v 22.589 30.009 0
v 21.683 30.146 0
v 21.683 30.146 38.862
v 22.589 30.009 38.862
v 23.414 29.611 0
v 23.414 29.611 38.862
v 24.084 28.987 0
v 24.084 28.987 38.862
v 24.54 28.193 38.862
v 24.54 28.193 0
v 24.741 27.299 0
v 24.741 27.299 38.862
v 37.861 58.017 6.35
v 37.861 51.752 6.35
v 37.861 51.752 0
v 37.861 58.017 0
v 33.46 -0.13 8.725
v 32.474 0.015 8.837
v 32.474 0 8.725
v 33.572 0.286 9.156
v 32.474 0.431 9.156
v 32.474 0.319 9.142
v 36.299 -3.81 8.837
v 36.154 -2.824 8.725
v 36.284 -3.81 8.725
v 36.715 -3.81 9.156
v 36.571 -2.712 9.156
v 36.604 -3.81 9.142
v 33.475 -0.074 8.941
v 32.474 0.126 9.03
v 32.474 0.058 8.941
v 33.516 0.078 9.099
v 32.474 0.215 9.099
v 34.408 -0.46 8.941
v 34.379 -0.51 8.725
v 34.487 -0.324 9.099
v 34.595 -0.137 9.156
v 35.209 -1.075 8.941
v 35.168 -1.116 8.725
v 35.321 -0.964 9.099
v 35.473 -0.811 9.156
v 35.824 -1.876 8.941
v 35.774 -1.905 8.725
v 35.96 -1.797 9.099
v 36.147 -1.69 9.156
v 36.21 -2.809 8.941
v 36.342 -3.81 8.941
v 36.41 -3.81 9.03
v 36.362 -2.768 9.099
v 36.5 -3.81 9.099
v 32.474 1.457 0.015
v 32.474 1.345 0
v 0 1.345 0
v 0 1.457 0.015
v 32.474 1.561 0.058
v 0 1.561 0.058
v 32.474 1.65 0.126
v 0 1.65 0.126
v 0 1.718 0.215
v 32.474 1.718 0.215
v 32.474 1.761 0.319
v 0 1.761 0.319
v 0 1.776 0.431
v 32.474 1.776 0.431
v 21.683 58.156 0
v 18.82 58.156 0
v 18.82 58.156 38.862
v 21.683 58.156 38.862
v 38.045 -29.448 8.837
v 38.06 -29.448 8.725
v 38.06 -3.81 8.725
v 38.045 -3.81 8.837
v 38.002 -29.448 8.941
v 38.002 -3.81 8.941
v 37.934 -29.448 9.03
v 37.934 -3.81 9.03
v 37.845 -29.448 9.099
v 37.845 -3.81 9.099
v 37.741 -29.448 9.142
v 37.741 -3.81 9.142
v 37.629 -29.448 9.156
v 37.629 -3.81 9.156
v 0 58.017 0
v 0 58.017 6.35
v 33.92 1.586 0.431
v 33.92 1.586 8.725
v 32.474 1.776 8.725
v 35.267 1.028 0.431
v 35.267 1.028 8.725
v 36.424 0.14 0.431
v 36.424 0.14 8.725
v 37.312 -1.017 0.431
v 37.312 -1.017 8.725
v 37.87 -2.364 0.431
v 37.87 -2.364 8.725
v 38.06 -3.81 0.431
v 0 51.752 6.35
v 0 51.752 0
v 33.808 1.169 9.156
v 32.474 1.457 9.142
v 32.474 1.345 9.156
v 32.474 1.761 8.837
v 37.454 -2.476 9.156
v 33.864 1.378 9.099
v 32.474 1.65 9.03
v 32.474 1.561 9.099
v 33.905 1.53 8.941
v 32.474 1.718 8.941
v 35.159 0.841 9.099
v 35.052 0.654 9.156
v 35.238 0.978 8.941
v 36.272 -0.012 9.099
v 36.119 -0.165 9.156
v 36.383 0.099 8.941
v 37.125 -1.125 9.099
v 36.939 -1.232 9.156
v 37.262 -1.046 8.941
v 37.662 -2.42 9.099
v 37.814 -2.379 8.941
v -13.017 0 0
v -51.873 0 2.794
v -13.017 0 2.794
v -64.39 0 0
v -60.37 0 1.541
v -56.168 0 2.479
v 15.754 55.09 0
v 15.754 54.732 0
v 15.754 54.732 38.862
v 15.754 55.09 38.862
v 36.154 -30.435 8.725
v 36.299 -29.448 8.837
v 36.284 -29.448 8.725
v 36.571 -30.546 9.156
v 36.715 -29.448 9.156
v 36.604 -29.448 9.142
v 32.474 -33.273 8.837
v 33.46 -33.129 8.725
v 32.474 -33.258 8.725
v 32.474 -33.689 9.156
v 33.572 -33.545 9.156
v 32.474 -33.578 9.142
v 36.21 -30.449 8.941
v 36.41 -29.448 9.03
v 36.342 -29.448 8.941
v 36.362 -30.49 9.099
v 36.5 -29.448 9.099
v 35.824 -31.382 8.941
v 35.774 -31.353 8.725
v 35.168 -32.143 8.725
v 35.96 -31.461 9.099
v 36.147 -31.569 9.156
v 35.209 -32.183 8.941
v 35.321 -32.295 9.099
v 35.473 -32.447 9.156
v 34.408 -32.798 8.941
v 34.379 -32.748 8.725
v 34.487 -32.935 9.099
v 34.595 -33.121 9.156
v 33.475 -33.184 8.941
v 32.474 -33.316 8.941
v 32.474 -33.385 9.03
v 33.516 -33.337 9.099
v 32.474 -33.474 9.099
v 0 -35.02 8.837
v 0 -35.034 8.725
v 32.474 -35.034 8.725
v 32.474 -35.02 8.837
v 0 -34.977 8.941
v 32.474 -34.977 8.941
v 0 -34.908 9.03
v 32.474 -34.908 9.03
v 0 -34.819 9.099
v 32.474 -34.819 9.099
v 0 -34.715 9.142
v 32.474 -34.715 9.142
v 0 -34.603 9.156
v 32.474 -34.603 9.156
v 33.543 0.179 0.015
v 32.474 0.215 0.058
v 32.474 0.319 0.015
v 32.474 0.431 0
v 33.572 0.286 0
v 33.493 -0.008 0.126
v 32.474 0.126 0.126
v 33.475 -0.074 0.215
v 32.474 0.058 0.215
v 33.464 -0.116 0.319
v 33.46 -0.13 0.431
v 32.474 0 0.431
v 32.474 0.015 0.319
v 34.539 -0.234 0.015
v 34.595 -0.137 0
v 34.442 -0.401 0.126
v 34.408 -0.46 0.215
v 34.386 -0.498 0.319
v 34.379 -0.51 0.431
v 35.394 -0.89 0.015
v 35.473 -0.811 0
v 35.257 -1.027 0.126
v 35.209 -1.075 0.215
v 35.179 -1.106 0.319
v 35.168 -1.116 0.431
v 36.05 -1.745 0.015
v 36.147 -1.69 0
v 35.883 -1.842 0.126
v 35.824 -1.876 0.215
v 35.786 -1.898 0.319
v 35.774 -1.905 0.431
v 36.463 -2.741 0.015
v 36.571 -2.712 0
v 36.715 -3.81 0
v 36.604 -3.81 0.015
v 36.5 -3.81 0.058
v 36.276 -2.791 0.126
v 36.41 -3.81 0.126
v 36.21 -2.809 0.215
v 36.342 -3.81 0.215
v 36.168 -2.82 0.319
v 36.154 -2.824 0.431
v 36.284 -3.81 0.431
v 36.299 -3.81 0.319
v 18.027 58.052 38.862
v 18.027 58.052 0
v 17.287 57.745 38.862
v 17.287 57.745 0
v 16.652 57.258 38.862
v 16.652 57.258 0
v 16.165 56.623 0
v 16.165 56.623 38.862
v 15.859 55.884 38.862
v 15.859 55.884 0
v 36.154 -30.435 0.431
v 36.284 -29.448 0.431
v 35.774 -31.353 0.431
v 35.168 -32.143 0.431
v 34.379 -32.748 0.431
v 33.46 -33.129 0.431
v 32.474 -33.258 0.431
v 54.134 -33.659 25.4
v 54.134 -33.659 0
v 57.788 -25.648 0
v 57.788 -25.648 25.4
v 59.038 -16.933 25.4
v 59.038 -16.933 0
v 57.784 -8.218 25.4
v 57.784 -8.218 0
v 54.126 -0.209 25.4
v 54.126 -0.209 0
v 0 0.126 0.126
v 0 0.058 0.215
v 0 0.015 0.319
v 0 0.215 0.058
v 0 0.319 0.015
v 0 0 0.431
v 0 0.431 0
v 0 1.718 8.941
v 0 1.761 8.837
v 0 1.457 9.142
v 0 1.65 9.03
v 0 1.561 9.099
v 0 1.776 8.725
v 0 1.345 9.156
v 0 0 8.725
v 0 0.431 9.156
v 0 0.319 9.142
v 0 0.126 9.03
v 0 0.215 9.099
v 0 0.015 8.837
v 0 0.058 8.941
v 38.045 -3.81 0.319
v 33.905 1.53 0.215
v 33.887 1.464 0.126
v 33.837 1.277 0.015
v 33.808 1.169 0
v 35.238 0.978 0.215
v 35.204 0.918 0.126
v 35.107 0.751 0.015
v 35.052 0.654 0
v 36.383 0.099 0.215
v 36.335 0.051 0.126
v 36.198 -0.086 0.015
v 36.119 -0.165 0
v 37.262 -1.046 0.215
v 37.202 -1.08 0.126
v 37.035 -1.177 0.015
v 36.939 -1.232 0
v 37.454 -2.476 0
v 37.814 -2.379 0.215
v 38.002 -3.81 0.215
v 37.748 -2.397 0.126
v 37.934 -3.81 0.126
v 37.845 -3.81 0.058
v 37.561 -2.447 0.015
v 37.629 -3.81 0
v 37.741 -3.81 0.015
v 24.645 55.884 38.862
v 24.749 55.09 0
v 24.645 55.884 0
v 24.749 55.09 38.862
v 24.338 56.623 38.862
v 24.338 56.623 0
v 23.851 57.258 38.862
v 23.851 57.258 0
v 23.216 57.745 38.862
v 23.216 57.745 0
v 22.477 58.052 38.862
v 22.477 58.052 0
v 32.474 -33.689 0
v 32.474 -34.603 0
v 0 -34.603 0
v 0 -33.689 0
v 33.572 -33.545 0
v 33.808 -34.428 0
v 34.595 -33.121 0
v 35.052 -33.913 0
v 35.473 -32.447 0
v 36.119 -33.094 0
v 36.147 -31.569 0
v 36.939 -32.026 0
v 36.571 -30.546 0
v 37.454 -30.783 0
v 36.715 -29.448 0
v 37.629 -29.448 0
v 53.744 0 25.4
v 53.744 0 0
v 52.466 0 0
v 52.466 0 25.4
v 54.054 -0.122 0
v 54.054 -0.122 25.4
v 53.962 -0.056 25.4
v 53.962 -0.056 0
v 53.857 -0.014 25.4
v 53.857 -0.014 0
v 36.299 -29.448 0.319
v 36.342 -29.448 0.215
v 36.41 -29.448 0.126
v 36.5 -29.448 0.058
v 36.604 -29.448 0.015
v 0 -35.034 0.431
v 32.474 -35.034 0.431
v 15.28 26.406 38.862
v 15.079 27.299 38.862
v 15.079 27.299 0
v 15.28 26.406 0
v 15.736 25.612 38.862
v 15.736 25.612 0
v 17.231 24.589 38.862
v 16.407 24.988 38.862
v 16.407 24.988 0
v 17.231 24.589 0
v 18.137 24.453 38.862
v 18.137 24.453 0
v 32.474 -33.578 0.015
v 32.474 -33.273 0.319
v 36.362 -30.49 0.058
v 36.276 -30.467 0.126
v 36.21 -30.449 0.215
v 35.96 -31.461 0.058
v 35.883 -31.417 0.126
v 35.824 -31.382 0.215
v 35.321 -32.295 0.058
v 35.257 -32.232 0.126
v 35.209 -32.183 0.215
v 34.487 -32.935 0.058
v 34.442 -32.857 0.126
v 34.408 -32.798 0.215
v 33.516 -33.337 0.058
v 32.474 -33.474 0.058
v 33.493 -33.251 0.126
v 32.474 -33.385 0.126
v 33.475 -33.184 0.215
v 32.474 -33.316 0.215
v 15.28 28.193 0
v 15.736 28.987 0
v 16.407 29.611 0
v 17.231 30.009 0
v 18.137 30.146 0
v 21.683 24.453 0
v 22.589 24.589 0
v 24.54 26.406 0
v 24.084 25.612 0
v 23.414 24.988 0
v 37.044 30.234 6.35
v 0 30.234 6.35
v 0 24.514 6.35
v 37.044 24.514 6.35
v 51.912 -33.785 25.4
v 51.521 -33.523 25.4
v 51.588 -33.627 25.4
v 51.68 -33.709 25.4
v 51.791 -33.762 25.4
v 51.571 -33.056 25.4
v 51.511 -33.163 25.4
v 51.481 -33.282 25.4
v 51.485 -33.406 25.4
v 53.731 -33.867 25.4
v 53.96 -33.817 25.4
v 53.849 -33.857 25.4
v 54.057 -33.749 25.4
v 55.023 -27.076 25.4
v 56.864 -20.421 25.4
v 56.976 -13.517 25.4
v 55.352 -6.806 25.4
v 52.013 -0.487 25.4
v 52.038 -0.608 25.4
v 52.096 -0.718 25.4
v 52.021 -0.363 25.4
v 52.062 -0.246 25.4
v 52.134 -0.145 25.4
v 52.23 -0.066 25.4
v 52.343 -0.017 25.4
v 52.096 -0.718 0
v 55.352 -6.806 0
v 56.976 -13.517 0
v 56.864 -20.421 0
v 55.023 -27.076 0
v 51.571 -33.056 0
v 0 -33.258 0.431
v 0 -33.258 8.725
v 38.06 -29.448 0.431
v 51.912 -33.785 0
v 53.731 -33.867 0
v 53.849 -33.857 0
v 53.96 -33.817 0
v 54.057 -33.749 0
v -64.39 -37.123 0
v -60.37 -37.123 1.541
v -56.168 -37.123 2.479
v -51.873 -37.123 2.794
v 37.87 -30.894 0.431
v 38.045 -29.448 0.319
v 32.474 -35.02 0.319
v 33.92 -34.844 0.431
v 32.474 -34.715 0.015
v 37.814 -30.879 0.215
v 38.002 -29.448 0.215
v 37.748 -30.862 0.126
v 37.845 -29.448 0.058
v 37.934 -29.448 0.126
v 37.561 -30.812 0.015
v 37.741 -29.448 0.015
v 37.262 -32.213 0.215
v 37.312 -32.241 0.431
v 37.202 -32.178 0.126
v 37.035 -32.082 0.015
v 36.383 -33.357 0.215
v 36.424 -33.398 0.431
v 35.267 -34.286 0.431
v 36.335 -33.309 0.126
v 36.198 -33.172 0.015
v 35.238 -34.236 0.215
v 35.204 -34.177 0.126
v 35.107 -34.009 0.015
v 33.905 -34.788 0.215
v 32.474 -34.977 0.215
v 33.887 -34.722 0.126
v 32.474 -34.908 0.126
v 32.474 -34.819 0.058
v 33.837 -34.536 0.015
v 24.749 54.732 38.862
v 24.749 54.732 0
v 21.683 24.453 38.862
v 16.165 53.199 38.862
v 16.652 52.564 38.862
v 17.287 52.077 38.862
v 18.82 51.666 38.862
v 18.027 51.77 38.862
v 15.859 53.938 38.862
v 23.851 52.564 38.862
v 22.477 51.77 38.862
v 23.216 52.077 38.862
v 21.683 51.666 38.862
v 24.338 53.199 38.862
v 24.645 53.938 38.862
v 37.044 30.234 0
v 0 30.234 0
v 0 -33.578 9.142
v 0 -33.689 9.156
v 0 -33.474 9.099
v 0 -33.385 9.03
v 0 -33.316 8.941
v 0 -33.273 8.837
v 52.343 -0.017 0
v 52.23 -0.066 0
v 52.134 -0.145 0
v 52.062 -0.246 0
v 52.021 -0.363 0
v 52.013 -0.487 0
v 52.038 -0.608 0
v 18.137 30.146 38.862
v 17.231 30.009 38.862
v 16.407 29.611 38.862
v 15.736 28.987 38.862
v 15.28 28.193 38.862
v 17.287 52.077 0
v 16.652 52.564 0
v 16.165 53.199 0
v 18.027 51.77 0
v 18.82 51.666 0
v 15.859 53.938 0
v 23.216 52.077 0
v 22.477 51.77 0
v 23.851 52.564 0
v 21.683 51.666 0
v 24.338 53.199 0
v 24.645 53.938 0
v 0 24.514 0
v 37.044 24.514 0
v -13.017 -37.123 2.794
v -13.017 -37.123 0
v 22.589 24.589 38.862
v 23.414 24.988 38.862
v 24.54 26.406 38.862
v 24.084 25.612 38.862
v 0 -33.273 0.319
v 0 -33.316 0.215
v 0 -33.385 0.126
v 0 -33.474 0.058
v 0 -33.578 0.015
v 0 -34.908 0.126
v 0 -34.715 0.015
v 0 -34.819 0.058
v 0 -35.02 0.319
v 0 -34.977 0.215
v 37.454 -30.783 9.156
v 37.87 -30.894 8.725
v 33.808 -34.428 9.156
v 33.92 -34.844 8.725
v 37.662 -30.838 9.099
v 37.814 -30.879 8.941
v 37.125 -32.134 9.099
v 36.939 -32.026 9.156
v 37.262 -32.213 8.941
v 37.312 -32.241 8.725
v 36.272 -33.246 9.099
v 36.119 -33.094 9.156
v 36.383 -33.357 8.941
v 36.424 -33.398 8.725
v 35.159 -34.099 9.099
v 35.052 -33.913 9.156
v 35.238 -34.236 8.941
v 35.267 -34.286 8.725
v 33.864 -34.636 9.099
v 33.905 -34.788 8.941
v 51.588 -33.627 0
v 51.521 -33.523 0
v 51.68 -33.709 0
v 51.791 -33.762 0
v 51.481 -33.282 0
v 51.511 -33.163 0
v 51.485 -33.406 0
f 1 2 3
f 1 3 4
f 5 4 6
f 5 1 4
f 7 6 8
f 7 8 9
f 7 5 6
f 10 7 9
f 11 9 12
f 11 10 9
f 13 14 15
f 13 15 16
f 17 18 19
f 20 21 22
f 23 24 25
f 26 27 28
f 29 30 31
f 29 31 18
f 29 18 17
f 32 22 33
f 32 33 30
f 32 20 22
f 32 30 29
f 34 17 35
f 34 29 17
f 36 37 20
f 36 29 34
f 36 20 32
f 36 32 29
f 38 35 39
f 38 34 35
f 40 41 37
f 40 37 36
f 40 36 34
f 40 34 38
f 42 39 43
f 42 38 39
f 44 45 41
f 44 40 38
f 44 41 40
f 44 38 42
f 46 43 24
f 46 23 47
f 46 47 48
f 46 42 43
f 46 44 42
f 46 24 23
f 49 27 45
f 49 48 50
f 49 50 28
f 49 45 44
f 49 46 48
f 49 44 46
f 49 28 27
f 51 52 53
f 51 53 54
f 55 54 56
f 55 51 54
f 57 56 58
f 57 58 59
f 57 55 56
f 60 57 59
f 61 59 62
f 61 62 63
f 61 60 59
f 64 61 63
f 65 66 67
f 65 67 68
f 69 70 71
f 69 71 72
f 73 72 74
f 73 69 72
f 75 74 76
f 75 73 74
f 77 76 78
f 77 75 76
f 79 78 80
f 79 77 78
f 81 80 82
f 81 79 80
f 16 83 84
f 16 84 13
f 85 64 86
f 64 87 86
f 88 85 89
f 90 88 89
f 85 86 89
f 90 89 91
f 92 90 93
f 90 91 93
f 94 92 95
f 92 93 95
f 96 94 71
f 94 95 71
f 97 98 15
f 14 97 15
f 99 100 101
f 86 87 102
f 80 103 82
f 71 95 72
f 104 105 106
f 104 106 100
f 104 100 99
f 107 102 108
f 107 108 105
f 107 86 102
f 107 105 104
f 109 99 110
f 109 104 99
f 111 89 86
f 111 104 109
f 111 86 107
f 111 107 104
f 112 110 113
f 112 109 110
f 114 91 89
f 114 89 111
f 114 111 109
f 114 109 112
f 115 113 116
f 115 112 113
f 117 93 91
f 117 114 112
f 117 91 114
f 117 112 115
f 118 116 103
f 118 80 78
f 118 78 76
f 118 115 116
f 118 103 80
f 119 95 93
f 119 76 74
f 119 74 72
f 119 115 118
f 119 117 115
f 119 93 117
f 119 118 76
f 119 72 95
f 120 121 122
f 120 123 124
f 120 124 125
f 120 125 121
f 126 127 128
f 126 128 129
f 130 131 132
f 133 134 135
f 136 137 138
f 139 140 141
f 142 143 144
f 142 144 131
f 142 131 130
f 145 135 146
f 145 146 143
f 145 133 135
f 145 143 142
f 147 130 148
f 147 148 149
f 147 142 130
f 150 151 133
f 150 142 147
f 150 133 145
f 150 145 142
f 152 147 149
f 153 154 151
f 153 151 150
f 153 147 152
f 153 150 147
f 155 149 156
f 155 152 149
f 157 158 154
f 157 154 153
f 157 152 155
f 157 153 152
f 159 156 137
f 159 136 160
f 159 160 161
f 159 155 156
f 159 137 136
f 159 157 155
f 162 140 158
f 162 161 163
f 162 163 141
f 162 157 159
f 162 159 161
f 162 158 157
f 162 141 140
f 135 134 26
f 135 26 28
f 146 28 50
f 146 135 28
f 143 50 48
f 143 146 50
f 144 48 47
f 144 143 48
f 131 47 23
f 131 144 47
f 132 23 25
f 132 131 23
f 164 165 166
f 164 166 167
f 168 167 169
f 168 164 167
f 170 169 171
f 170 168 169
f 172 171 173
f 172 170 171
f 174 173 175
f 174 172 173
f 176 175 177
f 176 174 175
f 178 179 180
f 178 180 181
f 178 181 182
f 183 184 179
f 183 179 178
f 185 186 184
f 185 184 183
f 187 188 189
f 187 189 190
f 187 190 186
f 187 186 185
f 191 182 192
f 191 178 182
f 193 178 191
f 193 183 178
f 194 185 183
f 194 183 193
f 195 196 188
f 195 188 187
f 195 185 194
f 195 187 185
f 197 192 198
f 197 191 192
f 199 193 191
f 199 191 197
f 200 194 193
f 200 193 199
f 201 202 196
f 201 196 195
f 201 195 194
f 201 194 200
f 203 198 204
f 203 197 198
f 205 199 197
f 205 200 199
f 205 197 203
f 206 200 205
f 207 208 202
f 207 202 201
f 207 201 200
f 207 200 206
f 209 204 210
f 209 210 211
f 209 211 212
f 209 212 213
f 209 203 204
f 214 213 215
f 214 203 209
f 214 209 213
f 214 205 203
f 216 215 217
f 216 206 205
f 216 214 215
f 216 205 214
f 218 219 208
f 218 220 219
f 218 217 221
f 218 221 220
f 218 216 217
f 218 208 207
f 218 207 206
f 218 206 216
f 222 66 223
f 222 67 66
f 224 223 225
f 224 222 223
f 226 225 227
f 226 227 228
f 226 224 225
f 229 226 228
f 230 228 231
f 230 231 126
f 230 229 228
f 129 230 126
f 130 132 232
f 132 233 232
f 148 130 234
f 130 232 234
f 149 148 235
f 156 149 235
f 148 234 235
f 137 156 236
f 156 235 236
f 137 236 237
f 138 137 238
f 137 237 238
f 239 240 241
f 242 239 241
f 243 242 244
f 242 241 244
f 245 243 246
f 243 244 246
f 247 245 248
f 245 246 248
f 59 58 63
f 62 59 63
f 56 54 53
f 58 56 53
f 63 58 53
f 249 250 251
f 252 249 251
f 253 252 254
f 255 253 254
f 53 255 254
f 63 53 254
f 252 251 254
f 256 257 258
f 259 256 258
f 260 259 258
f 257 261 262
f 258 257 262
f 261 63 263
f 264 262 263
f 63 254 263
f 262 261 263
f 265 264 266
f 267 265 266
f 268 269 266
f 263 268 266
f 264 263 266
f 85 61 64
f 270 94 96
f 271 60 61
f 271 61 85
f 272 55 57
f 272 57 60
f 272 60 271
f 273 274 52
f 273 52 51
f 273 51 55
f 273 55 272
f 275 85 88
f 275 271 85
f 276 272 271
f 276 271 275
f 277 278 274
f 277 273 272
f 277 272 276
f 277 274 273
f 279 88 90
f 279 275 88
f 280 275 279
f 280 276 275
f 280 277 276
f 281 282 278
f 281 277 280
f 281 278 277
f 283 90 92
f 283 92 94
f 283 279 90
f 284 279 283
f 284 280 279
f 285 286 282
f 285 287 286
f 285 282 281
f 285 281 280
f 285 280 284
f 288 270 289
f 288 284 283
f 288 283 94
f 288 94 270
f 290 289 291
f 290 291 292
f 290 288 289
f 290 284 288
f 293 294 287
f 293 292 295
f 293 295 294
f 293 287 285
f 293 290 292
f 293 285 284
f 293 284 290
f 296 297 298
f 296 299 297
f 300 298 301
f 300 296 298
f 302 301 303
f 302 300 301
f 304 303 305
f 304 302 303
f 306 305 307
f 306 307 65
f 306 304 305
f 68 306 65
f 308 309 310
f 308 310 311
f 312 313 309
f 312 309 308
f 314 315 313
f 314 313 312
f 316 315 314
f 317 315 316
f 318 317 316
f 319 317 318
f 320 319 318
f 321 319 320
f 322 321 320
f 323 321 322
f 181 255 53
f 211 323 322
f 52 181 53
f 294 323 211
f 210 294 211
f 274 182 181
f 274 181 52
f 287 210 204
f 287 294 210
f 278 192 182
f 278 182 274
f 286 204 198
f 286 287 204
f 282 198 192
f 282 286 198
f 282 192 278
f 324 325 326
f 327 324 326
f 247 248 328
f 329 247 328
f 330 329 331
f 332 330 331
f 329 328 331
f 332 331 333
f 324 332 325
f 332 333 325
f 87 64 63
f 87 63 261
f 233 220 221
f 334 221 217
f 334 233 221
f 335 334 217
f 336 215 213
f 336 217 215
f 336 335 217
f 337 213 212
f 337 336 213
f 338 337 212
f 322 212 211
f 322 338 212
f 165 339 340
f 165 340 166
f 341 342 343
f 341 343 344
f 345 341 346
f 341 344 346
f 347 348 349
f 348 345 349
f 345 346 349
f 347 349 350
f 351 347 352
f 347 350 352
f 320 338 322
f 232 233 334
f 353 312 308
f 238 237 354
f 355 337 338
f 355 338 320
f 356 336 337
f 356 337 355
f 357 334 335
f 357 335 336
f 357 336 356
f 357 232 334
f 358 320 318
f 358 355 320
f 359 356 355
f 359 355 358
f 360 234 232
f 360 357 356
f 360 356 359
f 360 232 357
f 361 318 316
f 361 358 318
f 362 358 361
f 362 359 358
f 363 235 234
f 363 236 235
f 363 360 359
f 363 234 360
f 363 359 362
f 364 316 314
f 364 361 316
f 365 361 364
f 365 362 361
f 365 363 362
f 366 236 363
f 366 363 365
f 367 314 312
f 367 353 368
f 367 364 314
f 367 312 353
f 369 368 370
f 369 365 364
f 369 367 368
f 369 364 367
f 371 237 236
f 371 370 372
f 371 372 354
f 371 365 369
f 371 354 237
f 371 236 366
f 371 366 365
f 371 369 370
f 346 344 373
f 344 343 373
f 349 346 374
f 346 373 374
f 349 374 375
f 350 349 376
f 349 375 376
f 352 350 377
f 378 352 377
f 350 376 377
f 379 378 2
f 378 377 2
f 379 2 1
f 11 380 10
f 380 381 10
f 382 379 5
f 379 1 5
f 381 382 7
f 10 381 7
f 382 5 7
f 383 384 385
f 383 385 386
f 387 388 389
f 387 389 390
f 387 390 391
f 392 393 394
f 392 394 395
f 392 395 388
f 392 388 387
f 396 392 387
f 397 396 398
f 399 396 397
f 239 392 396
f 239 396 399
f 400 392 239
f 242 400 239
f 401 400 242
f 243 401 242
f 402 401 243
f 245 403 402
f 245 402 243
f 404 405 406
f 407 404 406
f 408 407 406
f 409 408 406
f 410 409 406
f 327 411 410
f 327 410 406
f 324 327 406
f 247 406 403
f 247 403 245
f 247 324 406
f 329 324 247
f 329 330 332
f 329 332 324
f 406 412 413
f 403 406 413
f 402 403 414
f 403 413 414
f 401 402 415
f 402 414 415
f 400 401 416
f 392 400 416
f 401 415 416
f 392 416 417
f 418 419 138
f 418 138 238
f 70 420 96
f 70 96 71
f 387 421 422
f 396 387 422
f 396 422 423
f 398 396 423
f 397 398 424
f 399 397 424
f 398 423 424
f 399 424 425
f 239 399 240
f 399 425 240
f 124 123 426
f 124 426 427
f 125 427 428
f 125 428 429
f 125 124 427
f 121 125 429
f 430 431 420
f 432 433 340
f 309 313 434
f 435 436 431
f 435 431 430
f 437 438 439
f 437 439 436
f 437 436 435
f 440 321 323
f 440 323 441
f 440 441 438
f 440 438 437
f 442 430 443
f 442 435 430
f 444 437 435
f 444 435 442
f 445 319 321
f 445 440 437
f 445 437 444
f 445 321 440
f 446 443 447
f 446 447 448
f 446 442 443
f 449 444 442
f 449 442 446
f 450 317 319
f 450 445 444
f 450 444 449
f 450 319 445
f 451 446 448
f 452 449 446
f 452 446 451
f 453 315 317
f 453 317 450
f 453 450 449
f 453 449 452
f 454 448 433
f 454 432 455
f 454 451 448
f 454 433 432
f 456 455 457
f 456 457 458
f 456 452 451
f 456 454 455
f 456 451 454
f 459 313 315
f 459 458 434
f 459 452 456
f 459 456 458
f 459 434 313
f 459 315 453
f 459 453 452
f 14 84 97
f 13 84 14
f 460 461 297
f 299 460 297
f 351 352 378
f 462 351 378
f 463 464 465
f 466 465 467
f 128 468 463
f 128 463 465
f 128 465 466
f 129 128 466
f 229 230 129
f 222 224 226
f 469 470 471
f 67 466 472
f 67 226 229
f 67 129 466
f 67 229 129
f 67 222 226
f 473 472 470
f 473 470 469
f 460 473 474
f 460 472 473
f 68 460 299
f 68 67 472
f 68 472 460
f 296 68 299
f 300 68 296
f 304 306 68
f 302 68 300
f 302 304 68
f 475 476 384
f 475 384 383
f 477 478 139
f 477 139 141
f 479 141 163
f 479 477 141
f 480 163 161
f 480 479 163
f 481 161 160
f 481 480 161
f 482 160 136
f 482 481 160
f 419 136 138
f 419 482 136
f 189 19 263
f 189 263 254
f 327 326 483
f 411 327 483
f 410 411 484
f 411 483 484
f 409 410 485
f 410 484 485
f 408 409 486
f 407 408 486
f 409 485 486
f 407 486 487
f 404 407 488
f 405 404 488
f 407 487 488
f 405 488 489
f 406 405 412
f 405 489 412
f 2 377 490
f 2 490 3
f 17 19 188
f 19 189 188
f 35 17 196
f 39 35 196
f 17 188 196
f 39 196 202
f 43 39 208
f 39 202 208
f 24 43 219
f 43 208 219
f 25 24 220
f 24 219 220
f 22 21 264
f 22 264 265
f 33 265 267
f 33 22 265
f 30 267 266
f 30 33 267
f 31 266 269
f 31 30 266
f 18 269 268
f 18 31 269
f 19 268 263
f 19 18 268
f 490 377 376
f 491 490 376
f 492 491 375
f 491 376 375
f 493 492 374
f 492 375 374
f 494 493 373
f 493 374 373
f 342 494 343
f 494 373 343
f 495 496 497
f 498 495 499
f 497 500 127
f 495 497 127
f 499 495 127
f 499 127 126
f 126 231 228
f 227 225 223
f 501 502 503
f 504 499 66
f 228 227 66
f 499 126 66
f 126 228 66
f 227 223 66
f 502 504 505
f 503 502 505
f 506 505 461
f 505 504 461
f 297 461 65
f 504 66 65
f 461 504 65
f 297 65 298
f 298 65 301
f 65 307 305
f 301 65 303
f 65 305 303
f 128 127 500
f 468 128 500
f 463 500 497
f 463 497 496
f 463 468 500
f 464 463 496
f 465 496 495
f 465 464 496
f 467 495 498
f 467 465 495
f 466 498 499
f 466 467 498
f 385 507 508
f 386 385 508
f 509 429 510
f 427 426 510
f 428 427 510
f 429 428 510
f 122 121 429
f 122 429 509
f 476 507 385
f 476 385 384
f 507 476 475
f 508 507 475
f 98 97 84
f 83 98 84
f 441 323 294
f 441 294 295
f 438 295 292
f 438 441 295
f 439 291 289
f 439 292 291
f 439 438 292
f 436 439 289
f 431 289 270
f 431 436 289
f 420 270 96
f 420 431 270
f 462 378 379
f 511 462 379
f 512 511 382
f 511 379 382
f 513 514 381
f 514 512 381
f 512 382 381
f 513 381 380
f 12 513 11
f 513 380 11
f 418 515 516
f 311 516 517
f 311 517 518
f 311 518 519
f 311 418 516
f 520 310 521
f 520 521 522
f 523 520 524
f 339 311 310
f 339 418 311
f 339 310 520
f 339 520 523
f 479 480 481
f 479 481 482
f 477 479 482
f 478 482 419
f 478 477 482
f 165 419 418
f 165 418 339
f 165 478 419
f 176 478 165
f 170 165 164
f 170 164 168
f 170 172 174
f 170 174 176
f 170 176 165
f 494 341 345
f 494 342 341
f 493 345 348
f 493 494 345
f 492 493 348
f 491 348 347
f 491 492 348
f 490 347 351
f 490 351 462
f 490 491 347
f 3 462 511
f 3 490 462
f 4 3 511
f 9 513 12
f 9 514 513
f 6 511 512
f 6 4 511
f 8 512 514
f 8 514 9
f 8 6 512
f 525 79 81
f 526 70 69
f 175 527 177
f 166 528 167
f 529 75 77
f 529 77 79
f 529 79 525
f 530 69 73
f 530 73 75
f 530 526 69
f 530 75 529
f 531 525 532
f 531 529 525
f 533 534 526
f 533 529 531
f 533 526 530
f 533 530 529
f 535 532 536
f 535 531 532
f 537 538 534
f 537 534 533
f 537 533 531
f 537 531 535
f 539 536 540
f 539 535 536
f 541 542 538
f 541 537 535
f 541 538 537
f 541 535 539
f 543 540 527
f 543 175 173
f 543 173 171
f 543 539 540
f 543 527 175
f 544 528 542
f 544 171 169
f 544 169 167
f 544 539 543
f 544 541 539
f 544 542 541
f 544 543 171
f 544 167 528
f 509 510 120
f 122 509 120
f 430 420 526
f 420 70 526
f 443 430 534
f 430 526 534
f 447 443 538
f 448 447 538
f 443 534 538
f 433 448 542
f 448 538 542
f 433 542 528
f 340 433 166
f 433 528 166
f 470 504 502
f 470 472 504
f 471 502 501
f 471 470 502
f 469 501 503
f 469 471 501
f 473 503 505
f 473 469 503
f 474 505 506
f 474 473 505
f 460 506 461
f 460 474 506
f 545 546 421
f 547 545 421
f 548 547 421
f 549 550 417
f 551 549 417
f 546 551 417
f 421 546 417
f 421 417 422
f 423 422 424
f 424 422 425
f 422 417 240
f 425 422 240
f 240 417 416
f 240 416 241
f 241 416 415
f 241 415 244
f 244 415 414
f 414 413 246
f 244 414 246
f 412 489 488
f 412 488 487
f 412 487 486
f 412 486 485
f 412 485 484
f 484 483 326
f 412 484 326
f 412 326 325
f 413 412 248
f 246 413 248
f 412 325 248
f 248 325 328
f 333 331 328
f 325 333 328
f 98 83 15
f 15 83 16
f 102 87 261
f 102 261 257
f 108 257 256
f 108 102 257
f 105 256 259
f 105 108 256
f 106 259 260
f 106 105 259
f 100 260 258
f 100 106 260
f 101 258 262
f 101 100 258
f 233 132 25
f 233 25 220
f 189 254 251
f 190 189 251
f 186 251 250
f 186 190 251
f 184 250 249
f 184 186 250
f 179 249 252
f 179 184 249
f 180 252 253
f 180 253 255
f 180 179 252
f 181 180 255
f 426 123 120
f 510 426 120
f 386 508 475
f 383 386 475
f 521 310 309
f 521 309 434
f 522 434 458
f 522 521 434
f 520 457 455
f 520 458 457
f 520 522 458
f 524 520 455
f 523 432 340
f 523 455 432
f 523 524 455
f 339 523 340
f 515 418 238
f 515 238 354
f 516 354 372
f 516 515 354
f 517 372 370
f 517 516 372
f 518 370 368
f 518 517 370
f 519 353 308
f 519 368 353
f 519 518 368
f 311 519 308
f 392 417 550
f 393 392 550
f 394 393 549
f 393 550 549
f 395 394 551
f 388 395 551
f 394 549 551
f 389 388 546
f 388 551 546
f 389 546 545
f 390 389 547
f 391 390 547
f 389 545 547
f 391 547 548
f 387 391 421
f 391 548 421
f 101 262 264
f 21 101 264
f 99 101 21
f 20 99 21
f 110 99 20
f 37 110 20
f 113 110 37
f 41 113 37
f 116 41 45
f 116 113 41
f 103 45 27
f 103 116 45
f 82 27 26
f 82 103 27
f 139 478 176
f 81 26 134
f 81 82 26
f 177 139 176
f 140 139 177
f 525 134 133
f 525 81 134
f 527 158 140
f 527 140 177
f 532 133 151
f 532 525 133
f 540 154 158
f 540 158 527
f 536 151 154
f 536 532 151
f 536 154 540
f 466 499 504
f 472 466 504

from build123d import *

# Parameters (mm, degrees)
F5_DEPTH       = 25.4
F6_W           = 51.3728456572
F6_H           = 37.123337388
F7_DEPTH       = 2.794
F8_T1_DEPTH    = 99.7075344175
F9_W           = 37.8610342741
F9_H           = 6.2647759914
F10_DEPTH      = 6.35
F9_W_2         = 37.0438918471
F9_H_2         = 5.7200118899
F11_W          = 8.9951548725
F11_H          = 6.4901784062
F12_DEPTH      = 38.862
F11_W_2        = 9.6783321351
F11_H_2        = 5.6931376457
F13_F1_R       = 3.0660512242
F13_F2_R       = 3.0660512242
F13_F3_R       = 3.0660512242
F13_F4_R       = 3.0660512242
F13_2_T1_DEPTH = 54.1922561211


# Not quite as in the source:
# - a fillet or chamfer that OpenCascade refuses, or shapes differently, is made with other operations: its cross-section is extruded or revolved along the edge and cut away or added


with BuildPart() as f2:
    # F2: sweep along a path in F0
    with BuildLine(Plane.XY) as f2_path:
        Line((0, 0), (32.4741261244, 0))
        ThreePointArc((32.4741261244, 0), (35.1682029607, -1.1159231637), (36.2841261244, -3.81))
        Line((36.2841261244, -3.81), (36.2841261244, -29.4484232092))
        ThreePointArc((36.2841261244, -29.4484232092), (35.1682029607, -32.1425000455), (32.4741261244, -33.2584232092))
        Line((32.4741261244, -33.2584232092), (0, -33.2584232092))
    # F1 (on Right) → F2 (sweep)
    with BuildSketch(Plane.YZ):
        with BuildLine():
            Line((0, 8.7253075845), (0, 0.43095164))
            ThreePointArc((0, 0.43095164), (0.126222813, 0.126222813), (0.43095164, 0))
            Line((0.43095164, 0), (1.3450375525, 0))
            ThreePointArc((1.3450375525, 0), (1.6497663795, 0.126222813), (1.7759891925, 0.43095164))
            Line((1.7759891925, 0.43095164), (1.7759891925, 8.7253075845))
            ThreePointArc((1.7759891925, 8.7253075845), (1.6497663795, 9.0300364115), (1.3450375525, 9.1562592245))
            Line((1.3450375525, 9.1562592245), (0.43095164, 9.1562592245))
            ThreePointArc((0.43095164, 9.1562592245), (0.126222813, 9.0300364115), (0, 8.7253075845))
        make_face()
    sweep(path=f2_path.line)


with BuildPart() as f5:
    # F3 (on Top) → F5 (new body)
    with BuildSketch(Plane.XY):
        with BuildLine():
            ThreePointArc((53.7307702021, -33.8673758858), (53.9602055935, -33.8170389493), (54.1338617807, -33.658868362))
            ThreePointArc((54.1338617807, -33.658868362), (59.0379747248, -16.932750892), (54.1264548633, -0.2088069181))
            ThreePointArc((54.1264548633, -0.2088069181), (53.9619320492, -0.0556032477), (53.7441078084, 0))
            Line((53.7441078084, 0), (52.4662340509, 0))
            ThreePointArc((52.4662340509, 0), (52.0623861341, -0.2460332441), (52.0958026022, -0.7177416675))
            ThreePointArc((52.0958026022, -0.7177416675), (57.1389747881, -16.9727260502), (51.5711781882, -33.0555660979))
            ThreePointArc((51.5711781882, -33.0555660979), (51.5212198267, -33.5232749621), (51.9122386741, -33.7847165054))
            Line((51.9122386741, -33.7847165054), (53.7307702021, -33.8673758858))
        make_face()
    extrude(amount=F5_DEPTH)


with BuildPart() as f7:
    # F6 (on Top) → F7 (new body)
    with BuildSketch(Plane.XY):
        with Locations((-38.7038192712, -18.561668694)):
            Rectangle(F6_W, F6_H)
    extrude(amount=F7_DEPTH)

    # F8: fillet of radius 29.4340917525 on 1 edges, made by hand

    # F8_s2 → F8_t1 (cut)
    with BuildSketch(Plane.XZ.offset(-31.2920985147)):
        with BuildLine():
            ThreePointArc((-64.3902420998, 0), (-58.2858457679, 2.0870092345), (-51.8734026939, 2.794))
            Line((-51.8734026939, 2.794), (-64.3902420998, 2.794))
            Line((-64.3902420998, 2.794), (-64.3902420998, 0))
        make_face()
    extrude(amount=F8_T1_DEPTH, mode=Mode.SUBTRACT)


with BuildPart() as f10:
    # F9 (on Top) → F10 (new body)
    with BuildSketch(Plane.XY):
        with Locations((18.9305171371, 54.8848770559)):
            Rectangle(F9_W, F9_H)
    extrude(amount=F10_DEPTH)


with BuildPart() as f10b:
    # F9 (on Top) → F10, piece 2 (new body)
    with BuildSketch(Plane.XY):
        with Locations((18.5219459236, 27.3743439466)):
            Rectangle(F9_W_2, F9_H_2)
    extrude(amount=F10_DEPTH)


with BuildPart() as f12:
    # F11 (on Top) → F12 (new body)
    with BuildSketch(Plane.XY):
        with Locations((20.2516885474, 54.9109317362)):
            Rectangle(F11_W, F11_H)
    extrude(amount=F12_DEPTH)

    # F13: fillet of radius 3.0660512242 on 4 edges, made by hand

    # F13_f1
    f13_f1_edges = [f12.edges().sort_by_distance(p)[0] for p in [
        (24.7492659837, 58.1560209394, 19.431),
    ]]
    fillet(f13_f1_edges, radius=F13_F1_R)

    # F13_f2
    f13_f2_edges = [f12.edges().sort_by_distance(p)[0] for p in [
        (15.7541111112, 58.1560209394, 19.431),
    ]]
    fillet(f13_f2_edges, radius=F13_F2_R)

    # F13_f3
    f13_f3_edges = [f12.edges().sort_by_distance(p)[0] for p in [
        (15.7541111112, 51.6658425331, 19.431),
    ]]
    fillet(f13_f3_edges, radius=F13_F3_R)

    # F13_f4
    f13_f4_edges = [f12.edges().sort_by_distance(p)[0] for p in [
        (24.7492659837, 51.6658425331, 19.431),
    ]]
    fillet(f13_f4_edges, radius=F13_F4_R)


with BuildPart() as f12b:
    # F11 (on Top) → F12, piece 2 (new body)
    with BuildSketch(Plane.XY):
        with Locations((19.9100999162, 27.2992197424)):
            Rectangle(F11_W_2, F11_H_2)
    extrude(amount=F12_DEPTH)

    # F13#2: fillet of radius 3.0660512242 on 4 edges, made by hand

    # F13_2_s2 → F13_2_t1 (cut)
    with BuildSketch(Plane.XY.offset(-7.6651280605)):
        with BuildLine():
            ThreePointArc((15.0709338486, 27.5187021438), (15.9689594607, 25.3506765317), (18.1369850728, 24.4526509196))
            Line((18.1369850728, 24.4526509196), (15.0709338486, 24.4526509196))
            Line((15.0709338486, 24.4526509196), (15.0709338486, 27.5187021438))
        make_face()
        with BuildLine():
            ThreePointArc((21.6832147595, 24.4526509196), (23.8512403716, 25.3506765317), (24.7492659837, 27.5187021438))
            Line((24.7492659837, 27.5187021438), (24.7492659837, 24.4526509196))
            Line((24.7492659837, 24.4526509196), (21.6832147595, 24.4526509196))
        make_face()
        with BuildLine():
            ThreePointArc((21.6832147595, 30.1457885653), (23.8512403716, 29.2477629532), (24.7492659837, 27.0797373411))
            Line((24.7492659837, 27.0797373411), (24.7492659837, 30.1457885653))
            Line((24.7492659837, 30.1457885653), (21.6832147595, 30.1457885653))
        make_face()
        with BuildLine():
            ThreePointArc((18.1369850728, 30.1457885653), (15.9689594607, 29.2477629532), (15.0709338486, 27.0797373411))
            Line((15.0709338486, 27.0797373411), (15.0709338486, 30.1457885653))
            Line((15.0709338486, 30.1457885653), (18.1369850728, 30.1457885653))
        make_face()
    extrude(amount=F13_2_T1_DEPTH, mode=Mode.SUBTRACT)


solid = Compound([f2.part, f5.part, f7.part, f10.part, f10b.part, f12.part, f12b.part])
